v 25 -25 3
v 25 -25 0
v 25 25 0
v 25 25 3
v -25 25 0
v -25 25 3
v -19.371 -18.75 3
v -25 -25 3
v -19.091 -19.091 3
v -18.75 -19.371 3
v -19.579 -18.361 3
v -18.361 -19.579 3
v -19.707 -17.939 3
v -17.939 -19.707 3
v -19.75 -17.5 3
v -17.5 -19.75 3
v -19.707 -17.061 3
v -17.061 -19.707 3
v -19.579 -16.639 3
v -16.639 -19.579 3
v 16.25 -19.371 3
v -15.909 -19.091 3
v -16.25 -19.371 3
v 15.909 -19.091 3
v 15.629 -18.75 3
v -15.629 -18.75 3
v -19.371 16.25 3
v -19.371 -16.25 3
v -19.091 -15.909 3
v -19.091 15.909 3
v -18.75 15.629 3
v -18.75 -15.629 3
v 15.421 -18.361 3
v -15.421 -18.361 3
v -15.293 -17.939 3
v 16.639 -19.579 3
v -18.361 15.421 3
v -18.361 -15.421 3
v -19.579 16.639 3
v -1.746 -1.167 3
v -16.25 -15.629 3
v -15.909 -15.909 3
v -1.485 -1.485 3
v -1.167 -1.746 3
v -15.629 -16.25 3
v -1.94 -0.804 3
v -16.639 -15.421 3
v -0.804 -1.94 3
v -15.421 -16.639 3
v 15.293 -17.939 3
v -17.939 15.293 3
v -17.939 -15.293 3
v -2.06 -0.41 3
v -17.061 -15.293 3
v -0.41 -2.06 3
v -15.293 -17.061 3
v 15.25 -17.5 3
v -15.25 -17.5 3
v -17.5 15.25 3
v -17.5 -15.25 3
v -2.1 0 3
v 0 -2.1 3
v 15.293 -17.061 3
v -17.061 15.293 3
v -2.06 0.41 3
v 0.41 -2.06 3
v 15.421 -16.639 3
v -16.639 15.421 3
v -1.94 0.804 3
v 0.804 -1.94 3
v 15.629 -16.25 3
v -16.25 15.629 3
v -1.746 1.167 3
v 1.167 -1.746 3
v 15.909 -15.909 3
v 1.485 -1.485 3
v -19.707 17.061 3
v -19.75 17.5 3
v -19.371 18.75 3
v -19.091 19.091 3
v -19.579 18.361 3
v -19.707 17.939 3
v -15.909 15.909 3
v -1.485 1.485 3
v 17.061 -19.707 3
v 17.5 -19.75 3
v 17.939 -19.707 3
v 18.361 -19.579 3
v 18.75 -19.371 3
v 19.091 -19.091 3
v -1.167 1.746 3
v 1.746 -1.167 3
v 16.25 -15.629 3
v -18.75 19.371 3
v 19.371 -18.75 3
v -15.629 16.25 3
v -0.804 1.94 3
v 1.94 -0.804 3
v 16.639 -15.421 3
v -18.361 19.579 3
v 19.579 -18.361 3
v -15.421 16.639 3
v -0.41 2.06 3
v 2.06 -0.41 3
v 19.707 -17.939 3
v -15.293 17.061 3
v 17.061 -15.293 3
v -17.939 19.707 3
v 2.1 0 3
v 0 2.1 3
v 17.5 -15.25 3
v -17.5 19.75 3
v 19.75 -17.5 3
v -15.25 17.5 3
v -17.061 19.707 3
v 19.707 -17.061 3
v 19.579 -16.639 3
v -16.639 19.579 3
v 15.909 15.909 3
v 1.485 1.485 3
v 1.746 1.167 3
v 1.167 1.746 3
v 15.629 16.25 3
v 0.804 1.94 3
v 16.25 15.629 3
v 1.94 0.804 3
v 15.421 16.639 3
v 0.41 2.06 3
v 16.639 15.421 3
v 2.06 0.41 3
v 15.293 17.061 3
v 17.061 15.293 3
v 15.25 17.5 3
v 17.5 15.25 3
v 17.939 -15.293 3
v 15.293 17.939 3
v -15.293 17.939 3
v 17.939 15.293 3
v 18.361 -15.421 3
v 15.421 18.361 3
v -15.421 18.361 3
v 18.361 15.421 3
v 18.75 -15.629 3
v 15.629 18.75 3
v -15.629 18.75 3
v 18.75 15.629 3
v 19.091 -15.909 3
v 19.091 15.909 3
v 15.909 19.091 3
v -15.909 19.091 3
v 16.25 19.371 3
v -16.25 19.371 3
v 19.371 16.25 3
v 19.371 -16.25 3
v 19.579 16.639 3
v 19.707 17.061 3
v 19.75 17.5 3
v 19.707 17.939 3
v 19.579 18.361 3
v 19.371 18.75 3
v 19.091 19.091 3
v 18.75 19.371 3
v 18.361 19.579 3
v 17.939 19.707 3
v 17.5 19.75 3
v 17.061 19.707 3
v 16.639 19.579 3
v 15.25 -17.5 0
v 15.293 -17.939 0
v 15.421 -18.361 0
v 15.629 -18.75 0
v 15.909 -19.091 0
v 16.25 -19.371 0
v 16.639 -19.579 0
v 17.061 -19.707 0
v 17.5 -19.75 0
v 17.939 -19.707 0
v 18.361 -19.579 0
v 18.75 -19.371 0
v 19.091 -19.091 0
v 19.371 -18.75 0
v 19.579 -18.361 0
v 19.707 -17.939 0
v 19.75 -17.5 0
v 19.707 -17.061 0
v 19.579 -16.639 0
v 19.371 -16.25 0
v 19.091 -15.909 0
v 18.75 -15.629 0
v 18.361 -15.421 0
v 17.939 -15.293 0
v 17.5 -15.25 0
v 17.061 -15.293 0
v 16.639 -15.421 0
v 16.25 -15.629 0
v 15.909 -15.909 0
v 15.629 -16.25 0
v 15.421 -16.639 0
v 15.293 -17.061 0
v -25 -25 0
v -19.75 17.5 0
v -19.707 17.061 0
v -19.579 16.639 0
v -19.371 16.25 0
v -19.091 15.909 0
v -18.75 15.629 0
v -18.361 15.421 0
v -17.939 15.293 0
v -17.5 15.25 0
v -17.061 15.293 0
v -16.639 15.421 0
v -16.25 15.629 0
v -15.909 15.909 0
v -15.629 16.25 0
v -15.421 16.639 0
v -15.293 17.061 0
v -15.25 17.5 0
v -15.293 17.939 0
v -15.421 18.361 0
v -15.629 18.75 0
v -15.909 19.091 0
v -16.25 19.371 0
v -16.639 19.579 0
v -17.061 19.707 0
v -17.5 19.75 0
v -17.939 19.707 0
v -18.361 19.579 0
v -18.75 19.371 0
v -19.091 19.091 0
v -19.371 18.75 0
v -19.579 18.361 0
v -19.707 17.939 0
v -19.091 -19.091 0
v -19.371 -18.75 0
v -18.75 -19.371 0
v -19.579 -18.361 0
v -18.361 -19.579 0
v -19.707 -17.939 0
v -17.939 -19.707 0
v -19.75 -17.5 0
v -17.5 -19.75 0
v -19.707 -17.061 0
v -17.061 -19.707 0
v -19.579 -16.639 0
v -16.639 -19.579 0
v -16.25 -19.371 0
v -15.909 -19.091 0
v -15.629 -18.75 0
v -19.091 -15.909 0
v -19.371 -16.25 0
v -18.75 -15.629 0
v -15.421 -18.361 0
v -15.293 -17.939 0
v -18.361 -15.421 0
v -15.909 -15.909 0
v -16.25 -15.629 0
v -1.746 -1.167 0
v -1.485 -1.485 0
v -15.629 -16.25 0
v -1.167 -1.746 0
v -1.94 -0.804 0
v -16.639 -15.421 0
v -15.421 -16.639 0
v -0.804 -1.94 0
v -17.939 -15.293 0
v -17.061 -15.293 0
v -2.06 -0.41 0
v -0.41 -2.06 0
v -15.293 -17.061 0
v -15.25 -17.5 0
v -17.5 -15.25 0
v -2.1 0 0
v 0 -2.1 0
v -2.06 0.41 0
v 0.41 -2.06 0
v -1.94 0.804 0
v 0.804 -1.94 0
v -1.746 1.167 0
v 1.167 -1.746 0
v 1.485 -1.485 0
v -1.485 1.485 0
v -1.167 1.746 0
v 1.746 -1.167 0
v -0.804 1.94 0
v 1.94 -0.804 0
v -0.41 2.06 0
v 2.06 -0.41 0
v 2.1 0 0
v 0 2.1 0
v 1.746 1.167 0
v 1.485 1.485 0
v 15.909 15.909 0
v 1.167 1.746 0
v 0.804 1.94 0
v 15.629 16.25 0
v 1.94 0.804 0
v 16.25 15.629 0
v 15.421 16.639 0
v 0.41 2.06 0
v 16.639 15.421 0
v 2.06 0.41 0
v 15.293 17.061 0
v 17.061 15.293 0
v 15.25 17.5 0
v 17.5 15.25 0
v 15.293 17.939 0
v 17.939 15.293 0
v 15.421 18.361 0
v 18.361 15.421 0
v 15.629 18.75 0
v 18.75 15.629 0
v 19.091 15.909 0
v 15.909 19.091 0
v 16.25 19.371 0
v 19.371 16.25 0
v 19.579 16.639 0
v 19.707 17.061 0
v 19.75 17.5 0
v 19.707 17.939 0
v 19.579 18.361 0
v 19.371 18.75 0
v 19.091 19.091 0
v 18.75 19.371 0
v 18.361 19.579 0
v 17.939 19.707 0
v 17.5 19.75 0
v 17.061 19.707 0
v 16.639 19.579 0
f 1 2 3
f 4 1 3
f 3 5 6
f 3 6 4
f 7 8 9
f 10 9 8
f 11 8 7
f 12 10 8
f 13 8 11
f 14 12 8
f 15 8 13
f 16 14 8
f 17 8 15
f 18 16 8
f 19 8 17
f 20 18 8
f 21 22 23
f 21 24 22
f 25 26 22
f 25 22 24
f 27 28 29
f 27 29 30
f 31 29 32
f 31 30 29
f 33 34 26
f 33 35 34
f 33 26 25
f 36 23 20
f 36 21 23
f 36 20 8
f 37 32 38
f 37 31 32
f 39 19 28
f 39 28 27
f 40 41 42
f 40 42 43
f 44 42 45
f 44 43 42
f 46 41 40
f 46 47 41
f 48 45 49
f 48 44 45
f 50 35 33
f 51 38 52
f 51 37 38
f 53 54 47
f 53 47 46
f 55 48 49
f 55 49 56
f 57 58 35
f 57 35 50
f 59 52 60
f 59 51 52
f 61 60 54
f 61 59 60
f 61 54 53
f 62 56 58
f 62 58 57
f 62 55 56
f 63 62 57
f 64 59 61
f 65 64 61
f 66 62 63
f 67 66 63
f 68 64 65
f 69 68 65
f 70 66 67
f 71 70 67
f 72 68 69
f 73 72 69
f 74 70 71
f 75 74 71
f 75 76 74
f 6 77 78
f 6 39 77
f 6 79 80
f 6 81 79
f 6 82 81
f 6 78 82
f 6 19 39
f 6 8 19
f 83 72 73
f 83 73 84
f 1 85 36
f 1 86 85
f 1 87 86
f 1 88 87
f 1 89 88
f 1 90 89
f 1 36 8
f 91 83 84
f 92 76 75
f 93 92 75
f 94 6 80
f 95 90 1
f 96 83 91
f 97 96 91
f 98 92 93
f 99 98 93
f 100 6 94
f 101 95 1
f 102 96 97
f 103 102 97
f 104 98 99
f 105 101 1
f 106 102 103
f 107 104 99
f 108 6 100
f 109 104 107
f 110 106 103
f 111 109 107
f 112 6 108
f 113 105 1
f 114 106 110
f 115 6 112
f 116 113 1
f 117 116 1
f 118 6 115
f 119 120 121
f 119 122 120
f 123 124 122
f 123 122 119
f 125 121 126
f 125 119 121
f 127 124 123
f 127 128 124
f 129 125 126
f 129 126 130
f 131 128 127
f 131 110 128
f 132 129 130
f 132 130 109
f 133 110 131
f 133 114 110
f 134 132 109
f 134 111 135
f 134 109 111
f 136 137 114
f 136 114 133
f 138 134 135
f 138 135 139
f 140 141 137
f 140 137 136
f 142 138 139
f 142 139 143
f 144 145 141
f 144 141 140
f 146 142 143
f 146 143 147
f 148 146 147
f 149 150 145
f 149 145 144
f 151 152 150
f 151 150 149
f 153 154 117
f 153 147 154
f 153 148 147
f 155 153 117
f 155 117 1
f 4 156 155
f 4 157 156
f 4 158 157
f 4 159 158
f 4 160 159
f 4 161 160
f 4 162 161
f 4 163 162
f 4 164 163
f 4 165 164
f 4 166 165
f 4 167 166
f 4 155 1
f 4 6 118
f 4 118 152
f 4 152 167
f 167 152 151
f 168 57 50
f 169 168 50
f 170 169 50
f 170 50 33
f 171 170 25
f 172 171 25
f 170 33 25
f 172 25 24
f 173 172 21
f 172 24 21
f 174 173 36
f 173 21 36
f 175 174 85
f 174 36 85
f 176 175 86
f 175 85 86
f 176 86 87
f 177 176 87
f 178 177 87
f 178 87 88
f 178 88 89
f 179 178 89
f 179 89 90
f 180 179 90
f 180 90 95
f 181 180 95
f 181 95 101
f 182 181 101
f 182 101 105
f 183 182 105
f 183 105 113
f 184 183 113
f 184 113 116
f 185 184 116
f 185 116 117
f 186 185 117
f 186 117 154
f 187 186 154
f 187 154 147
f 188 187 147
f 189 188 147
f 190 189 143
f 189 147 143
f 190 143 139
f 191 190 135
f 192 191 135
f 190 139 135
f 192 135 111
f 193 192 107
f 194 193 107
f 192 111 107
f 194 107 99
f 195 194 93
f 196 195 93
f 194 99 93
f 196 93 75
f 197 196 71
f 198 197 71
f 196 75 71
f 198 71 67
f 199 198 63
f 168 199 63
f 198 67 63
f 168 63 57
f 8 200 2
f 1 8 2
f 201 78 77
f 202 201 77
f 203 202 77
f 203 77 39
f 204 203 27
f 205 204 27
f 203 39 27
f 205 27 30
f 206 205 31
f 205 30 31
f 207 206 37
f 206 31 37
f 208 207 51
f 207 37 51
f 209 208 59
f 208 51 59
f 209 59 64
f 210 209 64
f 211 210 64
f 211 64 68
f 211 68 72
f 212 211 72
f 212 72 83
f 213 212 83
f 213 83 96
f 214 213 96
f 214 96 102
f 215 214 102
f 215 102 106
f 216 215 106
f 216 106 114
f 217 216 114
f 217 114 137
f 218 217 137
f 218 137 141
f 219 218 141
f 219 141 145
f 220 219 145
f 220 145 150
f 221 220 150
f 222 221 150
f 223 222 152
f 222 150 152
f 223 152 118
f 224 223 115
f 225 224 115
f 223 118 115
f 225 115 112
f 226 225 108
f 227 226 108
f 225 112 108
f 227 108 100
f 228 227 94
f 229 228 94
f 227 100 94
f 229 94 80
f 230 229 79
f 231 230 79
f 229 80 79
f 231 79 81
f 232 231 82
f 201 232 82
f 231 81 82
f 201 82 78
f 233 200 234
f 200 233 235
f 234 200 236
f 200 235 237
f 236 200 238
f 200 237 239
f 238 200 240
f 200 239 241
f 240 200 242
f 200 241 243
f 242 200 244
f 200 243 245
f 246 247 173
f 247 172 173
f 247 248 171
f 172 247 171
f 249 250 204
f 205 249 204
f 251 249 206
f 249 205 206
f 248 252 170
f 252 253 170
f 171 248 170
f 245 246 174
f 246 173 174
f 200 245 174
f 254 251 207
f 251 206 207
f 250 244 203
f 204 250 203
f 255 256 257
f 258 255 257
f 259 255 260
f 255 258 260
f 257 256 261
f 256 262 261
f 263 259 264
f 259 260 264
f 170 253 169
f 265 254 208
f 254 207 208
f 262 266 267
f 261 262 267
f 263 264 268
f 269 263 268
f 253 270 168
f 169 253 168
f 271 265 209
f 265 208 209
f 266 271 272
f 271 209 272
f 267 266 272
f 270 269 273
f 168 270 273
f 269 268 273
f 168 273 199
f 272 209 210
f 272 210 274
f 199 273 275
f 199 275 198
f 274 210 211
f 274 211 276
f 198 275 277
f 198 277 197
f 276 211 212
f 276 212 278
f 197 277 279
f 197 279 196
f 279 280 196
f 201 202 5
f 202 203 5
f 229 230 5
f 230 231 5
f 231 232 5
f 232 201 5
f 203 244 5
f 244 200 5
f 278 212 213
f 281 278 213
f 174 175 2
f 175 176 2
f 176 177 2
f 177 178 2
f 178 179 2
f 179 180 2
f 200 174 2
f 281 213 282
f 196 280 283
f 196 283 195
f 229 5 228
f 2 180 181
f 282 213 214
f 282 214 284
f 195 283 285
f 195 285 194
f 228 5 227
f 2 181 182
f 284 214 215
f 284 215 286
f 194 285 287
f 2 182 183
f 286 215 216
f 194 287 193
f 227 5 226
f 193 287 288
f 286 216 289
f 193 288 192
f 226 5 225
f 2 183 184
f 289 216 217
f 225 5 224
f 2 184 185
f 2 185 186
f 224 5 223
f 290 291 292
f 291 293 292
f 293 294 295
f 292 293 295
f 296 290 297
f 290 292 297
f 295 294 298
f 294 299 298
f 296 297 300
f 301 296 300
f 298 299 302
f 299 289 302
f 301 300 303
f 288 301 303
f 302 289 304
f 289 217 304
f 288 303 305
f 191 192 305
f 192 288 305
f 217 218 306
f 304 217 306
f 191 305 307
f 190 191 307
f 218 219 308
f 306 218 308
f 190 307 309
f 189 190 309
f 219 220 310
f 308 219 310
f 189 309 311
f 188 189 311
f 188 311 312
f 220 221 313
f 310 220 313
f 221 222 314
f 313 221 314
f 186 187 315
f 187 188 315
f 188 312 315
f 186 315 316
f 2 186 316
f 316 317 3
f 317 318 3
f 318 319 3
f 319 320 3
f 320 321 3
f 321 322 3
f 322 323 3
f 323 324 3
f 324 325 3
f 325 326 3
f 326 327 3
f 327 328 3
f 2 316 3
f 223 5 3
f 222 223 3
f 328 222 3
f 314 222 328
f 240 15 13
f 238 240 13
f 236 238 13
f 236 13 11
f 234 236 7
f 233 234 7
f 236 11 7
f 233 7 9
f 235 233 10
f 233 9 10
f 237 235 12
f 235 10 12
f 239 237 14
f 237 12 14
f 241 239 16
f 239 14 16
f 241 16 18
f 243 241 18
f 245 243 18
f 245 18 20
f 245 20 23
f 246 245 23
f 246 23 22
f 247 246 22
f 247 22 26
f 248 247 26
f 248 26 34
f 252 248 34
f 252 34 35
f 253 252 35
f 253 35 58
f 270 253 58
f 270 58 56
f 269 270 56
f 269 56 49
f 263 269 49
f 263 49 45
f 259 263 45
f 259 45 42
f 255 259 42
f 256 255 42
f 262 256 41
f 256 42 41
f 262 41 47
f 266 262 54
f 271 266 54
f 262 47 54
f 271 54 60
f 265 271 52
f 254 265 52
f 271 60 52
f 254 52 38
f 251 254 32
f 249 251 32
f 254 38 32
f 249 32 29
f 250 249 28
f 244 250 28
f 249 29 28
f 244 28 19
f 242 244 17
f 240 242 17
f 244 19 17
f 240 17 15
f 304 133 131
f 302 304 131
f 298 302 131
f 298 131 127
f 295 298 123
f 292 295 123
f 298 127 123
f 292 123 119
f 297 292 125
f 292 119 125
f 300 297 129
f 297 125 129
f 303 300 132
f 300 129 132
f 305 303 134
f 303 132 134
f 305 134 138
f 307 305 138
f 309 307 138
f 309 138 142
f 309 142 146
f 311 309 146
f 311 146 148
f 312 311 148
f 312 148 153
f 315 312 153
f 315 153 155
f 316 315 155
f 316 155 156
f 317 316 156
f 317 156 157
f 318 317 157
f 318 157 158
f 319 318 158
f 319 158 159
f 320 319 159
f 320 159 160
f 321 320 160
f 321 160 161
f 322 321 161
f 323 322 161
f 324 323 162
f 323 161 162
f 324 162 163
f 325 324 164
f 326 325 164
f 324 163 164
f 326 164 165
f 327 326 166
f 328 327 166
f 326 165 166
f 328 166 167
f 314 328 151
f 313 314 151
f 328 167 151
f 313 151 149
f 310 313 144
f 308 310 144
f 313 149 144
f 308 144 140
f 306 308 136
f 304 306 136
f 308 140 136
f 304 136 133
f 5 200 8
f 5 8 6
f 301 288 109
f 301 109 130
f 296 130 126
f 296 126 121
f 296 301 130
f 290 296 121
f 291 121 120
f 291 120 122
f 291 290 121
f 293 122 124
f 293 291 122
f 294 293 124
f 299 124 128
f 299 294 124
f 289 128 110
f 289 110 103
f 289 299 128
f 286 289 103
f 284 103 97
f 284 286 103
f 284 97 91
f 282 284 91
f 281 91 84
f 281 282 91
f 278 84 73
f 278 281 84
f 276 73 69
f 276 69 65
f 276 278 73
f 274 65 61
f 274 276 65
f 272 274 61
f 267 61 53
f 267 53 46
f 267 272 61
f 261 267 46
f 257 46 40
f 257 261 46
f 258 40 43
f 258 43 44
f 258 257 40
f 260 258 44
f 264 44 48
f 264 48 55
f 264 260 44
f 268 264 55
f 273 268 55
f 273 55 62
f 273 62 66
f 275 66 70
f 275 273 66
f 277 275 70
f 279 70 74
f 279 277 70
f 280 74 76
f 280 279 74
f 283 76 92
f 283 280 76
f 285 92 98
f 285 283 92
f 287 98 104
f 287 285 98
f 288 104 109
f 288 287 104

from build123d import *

# Parameters (mm, degrees)
F0_W     = 50
F0_H     = 50
F0_R     = 2
F0_R_2   = 2.1
F1_DEPTH = 3
F2_D     = 4.5


# Not quite as in the source:
# - a feature names something its author has since deleted; it is built from what else it names


with BuildPart() as f1:
    # F0 (on Top) → F1 (new body)
    with BuildSketch(Plane.XY):
        with Locations((-3.725e-07, 2.55218e-05)):
            Rectangle(F0_W, F0_H)
        with Locations((-17.5000003725, -17.4999744782)):
            Circle(F0_R, mode=Mode.SUBTRACT)
        with Locations((17.4999996275, -17.4999744782)):
            Circle(F0_R, mode=Mode.SUBTRACT)
        Circle(F0_R_2, mode=Mode.SUBTRACT)
        with Locations((-17.5000003725, 17.5000255218)):
            Circle(F0_R, mode=Mode.SUBTRACT)
        with Locations((17.4999996275, 17.5000255218)):
            Circle(F0_R, mode=Mode.SUBTRACT)
    extrude(amount=F1_DEPTH)

    # F2 (through all)
    with Locations(Plane(origin=(0, 0, 0), x_dir=(1, 0, 0), z_dir=(0, 0, -1))):
        with Locations((-17.5000003725, 17.4999744782), (-17.5000003725, -17.5000255218), (17.4999996275, -17.5000255218), (17.4999996275, 17.4999744782)):
            Hole(F2_D / 2)


solid = f1.part
